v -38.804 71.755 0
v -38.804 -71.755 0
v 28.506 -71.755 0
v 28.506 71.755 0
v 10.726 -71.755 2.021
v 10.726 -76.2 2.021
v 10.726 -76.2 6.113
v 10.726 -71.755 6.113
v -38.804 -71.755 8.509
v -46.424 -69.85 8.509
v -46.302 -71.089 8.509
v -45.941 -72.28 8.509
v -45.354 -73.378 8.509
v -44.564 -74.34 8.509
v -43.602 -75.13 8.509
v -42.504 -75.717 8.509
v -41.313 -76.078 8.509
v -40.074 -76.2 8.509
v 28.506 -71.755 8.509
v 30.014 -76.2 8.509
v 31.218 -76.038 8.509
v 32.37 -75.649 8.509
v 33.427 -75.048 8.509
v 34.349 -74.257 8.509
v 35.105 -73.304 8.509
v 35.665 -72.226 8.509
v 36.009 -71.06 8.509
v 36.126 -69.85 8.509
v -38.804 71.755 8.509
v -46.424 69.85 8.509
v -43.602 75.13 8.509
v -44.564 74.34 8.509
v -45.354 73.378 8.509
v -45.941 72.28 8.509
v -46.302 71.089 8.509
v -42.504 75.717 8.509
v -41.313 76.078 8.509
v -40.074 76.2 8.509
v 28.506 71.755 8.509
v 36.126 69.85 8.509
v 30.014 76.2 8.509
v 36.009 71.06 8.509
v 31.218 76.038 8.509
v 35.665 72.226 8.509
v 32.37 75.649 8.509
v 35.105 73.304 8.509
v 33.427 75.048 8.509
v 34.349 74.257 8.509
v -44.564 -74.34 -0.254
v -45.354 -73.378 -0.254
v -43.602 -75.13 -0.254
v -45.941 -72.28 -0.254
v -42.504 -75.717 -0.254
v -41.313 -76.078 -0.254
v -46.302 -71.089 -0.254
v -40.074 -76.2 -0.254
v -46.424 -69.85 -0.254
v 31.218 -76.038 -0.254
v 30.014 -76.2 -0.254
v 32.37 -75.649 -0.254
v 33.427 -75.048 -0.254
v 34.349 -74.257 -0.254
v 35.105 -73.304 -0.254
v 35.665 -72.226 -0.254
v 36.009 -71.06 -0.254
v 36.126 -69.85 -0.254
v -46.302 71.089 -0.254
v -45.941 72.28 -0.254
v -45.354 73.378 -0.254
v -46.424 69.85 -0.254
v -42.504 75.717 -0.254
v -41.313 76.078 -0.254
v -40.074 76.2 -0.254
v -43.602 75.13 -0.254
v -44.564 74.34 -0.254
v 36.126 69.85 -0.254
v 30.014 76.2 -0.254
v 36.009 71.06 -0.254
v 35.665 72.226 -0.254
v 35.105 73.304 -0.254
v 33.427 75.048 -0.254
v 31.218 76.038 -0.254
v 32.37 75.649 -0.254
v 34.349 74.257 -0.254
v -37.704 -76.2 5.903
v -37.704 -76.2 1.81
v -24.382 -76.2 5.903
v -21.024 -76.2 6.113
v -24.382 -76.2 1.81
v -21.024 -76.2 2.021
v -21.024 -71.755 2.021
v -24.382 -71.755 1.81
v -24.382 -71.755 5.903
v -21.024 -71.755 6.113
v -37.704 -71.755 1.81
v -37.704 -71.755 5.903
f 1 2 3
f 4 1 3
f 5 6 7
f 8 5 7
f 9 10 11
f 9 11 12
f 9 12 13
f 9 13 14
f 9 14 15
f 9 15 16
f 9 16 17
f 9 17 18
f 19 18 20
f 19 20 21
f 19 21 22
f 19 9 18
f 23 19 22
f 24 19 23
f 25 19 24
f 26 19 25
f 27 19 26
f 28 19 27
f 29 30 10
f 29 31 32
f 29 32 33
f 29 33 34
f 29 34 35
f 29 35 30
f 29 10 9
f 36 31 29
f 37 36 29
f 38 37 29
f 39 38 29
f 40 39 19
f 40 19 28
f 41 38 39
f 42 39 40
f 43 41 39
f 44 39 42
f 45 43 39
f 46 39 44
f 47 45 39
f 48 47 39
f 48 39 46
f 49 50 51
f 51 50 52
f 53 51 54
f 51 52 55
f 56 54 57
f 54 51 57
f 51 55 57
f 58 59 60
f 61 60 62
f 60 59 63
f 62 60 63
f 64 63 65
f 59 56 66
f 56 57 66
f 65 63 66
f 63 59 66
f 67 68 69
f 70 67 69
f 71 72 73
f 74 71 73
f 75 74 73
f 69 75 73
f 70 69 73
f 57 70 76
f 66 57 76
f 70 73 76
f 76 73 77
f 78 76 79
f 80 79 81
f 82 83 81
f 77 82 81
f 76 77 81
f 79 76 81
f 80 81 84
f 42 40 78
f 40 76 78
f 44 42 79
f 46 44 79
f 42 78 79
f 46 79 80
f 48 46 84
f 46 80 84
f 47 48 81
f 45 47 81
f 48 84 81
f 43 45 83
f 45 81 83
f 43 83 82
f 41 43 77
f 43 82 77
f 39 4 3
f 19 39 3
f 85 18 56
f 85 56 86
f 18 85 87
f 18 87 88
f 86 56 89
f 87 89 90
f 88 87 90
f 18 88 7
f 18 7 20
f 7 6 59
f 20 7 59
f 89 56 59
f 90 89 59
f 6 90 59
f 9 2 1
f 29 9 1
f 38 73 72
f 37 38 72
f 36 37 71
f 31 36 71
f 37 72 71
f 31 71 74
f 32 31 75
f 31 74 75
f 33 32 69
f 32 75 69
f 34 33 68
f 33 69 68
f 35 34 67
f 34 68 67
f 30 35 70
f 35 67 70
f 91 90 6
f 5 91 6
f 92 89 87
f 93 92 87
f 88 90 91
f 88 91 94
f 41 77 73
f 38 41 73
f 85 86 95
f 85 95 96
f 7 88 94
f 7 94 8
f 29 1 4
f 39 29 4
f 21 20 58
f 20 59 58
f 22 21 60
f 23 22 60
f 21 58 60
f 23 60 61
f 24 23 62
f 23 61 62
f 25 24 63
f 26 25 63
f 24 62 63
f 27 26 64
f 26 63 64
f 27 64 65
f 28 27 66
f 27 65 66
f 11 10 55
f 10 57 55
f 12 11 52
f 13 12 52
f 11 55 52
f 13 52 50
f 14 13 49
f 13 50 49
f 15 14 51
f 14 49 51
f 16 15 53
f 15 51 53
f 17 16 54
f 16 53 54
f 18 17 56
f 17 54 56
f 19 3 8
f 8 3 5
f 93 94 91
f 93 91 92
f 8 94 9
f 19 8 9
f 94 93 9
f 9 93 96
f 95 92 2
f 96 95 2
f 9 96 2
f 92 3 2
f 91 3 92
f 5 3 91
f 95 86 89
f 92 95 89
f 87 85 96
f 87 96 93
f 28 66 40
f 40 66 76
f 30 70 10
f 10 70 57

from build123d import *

# Parameters (mm, degrees)
F1_DEPTH = 0.254
F2_DEPTH = 8.509
F3_W     = 31.75
F3_H     = 4.092419
F3_W_2   = 13.322128
F4_DEPTH = 25.4


with BuildPart() as f1:
    # F0 (on Top) → F1 (new body)
    with BuildSketch(Plane.XY):
        with BuildLine():
            Line((-46.424261, 69.85), (-46.424261, 0))
            Line((-46.424261, 0), (-46.424261, -69.85))
            ThreePointArc((-46.424261, -69.85), (-44.564389, -74.340128), (-40.074261, -76.2))
            Line((-40.074261, -76.2), (30.013567, -76.2))
            ThreePointArc((30.013567, -76.2), (34.34943, -74.256845), (36.125739, -69.85))
            Line((36.125739, -69.85), (36.125739, 0))
            Line((36.125739, 0), (36.125739, 69.85))
            ThreePointArc((36.125739, 69.85), (34.34943, 74.256845), (30.013567, 76.2))
            Line((30.013567, 76.2), (-40.074261, 76.2))
            ThreePointArc((-40.074261, 76.2), (-44.564389, 74.340128), (-46.424261, 69.85))
        make_face()
        Polygon((-38.804261, 0), (-38.804261, 71.755), (28.505739, 71.755), (28.505739, 0), (28.505739, -71.755), (-38.804261, -71.755), align=None, mode=Mode.SUBTRACT)
        Polygon((28.505739, 71.755), (-38.804261, 71.755), (-38.804261, 0), (-38.804261, -71.755), (28.505739, -71.755), (28.505739, 0), align=None)
    extrude(amount=-F1_DEPTH)

    # F0 (on Top) → F2 (join)
    with BuildSketch(Plane.XY):
        with BuildLine():
            Line((-46.424261, 69.85), (-46.424261, 0))
            Line((-46.424261, 0), (-46.424261, -69.85))
            ThreePointArc((-46.424261, -69.85), (-44.564389, -74.340128), (-40.074261, -76.2))
            Line((-40.074261, -76.2), (30.013567, -76.2))
            ThreePointArc((30.013567, -76.2), (34.34943, -74.256845), (36.125739, -69.85))
            Line((36.125739, -69.85), (36.125739, 0))
            Line((36.125739, 0), (36.125739, 69.85))
            ThreePointArc((36.125739, 69.85), (34.34943, 74.256845), (30.013567, 76.2))
            Line((30.013567, 76.2), (-40.074261, 76.2))
            ThreePointArc((-40.074261, 76.2), (-44.564389, 74.340128), (-46.424261, 69.85))
        make_face()
        Polygon((-38.804261, 0), (-38.804261, 71.755), (28.505739, 71.755), (28.505739, 0), (28.505739, -71.755), (-38.804261, -71.755), align=None, mode=Mode.SUBTRACT)
    extrude(amount=F2_DEPTH)

    # F3 (on face) → F4 (cut)
    with BuildSketch(Plane.XZ.offset(76.2)):
        with Locations((-5.149261, 4.066918)):
            Rectangle(F3_W, F3_H)
        with Locations((-31.042797, 3.856391)):
            Rectangle(F3_W_2, F3_H)
    extrude(amount=-F4_DEPTH, mode=Mode.SUBTRACT)


solid = f1.part
